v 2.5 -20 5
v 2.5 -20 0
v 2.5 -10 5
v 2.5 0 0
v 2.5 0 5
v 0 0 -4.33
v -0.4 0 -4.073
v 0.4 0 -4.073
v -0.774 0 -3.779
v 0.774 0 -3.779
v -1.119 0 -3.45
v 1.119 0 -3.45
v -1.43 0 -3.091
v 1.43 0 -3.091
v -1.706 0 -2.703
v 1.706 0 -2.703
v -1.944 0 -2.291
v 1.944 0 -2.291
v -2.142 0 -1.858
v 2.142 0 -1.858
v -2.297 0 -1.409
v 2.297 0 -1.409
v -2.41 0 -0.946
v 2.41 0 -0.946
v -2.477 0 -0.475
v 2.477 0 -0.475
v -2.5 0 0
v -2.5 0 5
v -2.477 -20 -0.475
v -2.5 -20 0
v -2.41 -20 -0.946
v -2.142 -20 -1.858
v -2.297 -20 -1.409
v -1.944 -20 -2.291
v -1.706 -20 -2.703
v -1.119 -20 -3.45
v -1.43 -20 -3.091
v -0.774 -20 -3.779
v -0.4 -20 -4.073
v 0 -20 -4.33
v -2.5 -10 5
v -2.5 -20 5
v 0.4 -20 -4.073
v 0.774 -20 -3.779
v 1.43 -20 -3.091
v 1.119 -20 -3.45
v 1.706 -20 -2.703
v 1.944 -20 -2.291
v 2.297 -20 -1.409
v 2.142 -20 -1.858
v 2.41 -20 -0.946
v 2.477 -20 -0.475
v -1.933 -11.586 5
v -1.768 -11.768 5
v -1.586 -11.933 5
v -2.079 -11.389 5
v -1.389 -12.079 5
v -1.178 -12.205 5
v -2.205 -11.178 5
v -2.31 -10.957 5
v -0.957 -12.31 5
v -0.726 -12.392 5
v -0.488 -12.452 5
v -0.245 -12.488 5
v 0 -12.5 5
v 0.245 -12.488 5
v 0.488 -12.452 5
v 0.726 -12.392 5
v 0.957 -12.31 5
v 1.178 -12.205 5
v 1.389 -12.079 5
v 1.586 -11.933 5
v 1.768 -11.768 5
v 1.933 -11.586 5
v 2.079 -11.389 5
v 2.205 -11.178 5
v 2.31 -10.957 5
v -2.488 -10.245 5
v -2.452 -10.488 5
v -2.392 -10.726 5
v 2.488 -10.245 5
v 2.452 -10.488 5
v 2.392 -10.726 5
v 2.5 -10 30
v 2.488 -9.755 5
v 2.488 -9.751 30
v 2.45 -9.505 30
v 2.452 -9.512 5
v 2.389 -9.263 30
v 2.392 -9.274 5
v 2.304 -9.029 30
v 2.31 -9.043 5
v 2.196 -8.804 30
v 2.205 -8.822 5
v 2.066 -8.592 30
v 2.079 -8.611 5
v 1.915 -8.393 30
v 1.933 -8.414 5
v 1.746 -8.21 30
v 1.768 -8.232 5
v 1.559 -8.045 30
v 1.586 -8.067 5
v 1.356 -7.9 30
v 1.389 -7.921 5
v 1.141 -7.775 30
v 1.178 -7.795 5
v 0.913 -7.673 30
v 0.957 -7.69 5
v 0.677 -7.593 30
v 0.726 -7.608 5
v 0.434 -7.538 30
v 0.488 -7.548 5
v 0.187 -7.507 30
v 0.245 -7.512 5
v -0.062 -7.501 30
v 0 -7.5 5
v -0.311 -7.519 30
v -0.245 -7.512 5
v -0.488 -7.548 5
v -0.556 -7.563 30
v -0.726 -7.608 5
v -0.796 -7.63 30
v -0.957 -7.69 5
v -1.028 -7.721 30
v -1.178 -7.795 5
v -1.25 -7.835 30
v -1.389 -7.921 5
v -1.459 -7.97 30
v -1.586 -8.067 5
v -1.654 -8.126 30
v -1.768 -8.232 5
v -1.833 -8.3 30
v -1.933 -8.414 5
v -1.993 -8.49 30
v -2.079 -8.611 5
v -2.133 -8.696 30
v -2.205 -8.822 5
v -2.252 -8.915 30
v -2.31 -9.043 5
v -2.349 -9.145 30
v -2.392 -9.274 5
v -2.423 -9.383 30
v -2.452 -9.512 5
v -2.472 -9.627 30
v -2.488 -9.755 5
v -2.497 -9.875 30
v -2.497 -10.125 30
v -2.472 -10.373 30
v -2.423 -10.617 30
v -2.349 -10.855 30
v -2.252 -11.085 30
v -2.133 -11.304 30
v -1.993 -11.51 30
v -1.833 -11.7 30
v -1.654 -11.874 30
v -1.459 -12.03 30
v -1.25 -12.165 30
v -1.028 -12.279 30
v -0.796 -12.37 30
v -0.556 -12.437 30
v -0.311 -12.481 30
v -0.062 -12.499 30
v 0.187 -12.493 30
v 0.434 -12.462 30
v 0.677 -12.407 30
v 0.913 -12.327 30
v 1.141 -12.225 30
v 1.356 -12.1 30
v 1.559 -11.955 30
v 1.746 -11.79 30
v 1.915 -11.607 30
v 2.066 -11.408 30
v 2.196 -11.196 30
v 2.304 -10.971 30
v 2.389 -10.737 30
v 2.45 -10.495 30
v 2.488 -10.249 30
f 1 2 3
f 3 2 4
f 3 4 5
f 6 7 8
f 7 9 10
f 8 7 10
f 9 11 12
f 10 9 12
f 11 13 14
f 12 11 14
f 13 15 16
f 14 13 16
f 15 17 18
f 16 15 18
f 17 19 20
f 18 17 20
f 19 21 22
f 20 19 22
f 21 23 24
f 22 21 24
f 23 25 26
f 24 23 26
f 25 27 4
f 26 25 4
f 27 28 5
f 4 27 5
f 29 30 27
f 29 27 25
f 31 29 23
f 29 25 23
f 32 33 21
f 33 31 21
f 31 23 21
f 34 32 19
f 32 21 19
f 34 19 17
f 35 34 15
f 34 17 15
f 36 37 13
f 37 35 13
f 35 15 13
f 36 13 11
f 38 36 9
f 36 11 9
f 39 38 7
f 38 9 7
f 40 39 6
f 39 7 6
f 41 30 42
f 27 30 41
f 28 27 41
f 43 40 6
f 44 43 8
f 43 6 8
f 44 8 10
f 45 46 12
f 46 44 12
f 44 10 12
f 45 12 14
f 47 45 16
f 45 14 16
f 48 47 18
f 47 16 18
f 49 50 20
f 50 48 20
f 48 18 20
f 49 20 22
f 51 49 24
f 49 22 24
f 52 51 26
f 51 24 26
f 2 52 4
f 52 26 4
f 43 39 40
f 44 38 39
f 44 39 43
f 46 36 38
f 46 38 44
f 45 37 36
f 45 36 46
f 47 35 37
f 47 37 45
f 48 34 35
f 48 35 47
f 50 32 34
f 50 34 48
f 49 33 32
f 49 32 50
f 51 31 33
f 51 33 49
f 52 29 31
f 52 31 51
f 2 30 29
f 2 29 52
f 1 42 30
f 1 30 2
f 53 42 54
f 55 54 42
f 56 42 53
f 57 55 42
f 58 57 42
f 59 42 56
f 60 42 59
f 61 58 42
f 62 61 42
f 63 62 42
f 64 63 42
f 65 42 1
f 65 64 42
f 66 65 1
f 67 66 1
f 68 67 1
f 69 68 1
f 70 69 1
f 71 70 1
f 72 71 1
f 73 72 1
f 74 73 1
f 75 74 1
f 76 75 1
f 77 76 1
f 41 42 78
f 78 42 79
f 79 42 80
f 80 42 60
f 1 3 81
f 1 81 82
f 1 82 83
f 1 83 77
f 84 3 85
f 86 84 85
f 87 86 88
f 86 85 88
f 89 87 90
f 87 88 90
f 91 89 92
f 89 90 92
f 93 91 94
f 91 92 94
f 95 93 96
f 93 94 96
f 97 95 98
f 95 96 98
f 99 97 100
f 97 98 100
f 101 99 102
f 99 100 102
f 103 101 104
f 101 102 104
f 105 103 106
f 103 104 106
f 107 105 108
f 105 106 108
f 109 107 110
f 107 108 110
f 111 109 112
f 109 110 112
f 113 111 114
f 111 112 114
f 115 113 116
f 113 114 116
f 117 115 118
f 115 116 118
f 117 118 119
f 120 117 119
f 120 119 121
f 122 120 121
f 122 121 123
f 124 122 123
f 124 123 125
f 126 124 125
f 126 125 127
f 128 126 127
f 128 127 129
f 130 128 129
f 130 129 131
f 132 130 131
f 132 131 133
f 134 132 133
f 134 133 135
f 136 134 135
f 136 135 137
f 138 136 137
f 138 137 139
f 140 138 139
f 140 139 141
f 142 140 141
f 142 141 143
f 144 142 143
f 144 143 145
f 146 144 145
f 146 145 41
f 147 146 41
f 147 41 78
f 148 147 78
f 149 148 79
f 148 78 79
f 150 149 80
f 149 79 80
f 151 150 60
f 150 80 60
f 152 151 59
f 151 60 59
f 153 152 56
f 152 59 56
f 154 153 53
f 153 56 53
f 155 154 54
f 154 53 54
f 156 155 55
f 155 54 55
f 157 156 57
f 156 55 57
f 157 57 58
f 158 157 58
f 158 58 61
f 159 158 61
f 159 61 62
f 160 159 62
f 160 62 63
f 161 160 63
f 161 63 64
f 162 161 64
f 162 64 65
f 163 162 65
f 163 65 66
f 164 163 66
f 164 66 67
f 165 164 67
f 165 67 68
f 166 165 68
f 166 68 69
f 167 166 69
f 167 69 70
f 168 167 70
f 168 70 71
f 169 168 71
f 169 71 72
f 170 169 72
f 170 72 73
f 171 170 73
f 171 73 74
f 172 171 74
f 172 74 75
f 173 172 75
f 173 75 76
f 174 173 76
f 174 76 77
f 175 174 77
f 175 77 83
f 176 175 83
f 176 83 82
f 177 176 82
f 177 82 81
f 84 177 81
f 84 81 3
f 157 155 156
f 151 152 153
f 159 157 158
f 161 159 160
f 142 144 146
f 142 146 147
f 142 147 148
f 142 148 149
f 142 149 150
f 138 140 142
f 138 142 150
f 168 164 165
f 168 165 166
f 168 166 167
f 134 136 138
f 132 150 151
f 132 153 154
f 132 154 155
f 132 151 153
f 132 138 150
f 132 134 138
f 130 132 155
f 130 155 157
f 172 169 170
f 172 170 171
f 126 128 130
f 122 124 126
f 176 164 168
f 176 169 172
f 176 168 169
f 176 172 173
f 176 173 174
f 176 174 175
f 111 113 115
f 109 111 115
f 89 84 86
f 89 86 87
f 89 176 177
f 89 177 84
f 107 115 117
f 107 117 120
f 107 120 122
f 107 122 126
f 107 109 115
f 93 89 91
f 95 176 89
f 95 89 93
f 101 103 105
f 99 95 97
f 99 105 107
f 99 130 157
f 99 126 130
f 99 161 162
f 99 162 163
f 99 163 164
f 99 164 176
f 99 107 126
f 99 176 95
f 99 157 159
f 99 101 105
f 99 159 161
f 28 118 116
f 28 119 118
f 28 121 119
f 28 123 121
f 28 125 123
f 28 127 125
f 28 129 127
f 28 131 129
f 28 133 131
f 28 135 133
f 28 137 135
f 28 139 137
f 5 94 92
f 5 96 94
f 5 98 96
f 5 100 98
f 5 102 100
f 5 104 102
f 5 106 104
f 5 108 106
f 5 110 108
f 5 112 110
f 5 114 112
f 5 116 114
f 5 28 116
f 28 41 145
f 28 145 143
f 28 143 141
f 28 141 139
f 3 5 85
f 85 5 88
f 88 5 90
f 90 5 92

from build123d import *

# Parameters (mm, degrees)
F0_W        = 5
F0_H        = 10
F1_DEPTH    = 20
F2_T1_DEPTH = 45
F3_R        = 2.5
F4_DEPTH    = 25


# Not quite as in the source:
# - a fillet or chamfer that OpenCascade refuses, or shapes differently, is made with other operations: its cross-section is extruded or revolved along the edge and cut away or added


with BuildPart() as f1:
    # F0 (on Front) → F1 (new body)
    with BuildSketch(Plane.XZ):
        Rectangle(F0_W, F0_H)
    extrude(amount=F1_DEPTH)

    # F2: fillet of radius 5 on 2 edges, made by hand

    # F2_s2 → F2_t1 (cut)
    with BuildSketch(Plane.XZ.offset(-12.5)):
        with BuildLine():
            ThreePointArc((-2.5, 0), (-1.0355339059, -3.5355339059), (2.5, -5))
            Line((2.5, -5), (-2.5, -5))
            Line((-2.5, -5), (-2.5, 0))
        make_face()
        with BuildLine():
            ThreePointArc((-2.5, -5), (1.0355339059, -3.5355339059), (2.5, 0))
            Line((2.5, 0), (2.5, -5))
            Line((2.5, -5), (-2.5, -5))
        make_face()
    extrude(amount=F2_T1_DEPTH, mode=Mode.SUBTRACT)

    # F3 (on face) → F4 (join)
    with BuildSketch(Plane.XY.offset(5)):
        with Locations((0, -10)):
            Circle(F3_R)
    extrude(amount=F4_DEPTH)


solid = f1.part
